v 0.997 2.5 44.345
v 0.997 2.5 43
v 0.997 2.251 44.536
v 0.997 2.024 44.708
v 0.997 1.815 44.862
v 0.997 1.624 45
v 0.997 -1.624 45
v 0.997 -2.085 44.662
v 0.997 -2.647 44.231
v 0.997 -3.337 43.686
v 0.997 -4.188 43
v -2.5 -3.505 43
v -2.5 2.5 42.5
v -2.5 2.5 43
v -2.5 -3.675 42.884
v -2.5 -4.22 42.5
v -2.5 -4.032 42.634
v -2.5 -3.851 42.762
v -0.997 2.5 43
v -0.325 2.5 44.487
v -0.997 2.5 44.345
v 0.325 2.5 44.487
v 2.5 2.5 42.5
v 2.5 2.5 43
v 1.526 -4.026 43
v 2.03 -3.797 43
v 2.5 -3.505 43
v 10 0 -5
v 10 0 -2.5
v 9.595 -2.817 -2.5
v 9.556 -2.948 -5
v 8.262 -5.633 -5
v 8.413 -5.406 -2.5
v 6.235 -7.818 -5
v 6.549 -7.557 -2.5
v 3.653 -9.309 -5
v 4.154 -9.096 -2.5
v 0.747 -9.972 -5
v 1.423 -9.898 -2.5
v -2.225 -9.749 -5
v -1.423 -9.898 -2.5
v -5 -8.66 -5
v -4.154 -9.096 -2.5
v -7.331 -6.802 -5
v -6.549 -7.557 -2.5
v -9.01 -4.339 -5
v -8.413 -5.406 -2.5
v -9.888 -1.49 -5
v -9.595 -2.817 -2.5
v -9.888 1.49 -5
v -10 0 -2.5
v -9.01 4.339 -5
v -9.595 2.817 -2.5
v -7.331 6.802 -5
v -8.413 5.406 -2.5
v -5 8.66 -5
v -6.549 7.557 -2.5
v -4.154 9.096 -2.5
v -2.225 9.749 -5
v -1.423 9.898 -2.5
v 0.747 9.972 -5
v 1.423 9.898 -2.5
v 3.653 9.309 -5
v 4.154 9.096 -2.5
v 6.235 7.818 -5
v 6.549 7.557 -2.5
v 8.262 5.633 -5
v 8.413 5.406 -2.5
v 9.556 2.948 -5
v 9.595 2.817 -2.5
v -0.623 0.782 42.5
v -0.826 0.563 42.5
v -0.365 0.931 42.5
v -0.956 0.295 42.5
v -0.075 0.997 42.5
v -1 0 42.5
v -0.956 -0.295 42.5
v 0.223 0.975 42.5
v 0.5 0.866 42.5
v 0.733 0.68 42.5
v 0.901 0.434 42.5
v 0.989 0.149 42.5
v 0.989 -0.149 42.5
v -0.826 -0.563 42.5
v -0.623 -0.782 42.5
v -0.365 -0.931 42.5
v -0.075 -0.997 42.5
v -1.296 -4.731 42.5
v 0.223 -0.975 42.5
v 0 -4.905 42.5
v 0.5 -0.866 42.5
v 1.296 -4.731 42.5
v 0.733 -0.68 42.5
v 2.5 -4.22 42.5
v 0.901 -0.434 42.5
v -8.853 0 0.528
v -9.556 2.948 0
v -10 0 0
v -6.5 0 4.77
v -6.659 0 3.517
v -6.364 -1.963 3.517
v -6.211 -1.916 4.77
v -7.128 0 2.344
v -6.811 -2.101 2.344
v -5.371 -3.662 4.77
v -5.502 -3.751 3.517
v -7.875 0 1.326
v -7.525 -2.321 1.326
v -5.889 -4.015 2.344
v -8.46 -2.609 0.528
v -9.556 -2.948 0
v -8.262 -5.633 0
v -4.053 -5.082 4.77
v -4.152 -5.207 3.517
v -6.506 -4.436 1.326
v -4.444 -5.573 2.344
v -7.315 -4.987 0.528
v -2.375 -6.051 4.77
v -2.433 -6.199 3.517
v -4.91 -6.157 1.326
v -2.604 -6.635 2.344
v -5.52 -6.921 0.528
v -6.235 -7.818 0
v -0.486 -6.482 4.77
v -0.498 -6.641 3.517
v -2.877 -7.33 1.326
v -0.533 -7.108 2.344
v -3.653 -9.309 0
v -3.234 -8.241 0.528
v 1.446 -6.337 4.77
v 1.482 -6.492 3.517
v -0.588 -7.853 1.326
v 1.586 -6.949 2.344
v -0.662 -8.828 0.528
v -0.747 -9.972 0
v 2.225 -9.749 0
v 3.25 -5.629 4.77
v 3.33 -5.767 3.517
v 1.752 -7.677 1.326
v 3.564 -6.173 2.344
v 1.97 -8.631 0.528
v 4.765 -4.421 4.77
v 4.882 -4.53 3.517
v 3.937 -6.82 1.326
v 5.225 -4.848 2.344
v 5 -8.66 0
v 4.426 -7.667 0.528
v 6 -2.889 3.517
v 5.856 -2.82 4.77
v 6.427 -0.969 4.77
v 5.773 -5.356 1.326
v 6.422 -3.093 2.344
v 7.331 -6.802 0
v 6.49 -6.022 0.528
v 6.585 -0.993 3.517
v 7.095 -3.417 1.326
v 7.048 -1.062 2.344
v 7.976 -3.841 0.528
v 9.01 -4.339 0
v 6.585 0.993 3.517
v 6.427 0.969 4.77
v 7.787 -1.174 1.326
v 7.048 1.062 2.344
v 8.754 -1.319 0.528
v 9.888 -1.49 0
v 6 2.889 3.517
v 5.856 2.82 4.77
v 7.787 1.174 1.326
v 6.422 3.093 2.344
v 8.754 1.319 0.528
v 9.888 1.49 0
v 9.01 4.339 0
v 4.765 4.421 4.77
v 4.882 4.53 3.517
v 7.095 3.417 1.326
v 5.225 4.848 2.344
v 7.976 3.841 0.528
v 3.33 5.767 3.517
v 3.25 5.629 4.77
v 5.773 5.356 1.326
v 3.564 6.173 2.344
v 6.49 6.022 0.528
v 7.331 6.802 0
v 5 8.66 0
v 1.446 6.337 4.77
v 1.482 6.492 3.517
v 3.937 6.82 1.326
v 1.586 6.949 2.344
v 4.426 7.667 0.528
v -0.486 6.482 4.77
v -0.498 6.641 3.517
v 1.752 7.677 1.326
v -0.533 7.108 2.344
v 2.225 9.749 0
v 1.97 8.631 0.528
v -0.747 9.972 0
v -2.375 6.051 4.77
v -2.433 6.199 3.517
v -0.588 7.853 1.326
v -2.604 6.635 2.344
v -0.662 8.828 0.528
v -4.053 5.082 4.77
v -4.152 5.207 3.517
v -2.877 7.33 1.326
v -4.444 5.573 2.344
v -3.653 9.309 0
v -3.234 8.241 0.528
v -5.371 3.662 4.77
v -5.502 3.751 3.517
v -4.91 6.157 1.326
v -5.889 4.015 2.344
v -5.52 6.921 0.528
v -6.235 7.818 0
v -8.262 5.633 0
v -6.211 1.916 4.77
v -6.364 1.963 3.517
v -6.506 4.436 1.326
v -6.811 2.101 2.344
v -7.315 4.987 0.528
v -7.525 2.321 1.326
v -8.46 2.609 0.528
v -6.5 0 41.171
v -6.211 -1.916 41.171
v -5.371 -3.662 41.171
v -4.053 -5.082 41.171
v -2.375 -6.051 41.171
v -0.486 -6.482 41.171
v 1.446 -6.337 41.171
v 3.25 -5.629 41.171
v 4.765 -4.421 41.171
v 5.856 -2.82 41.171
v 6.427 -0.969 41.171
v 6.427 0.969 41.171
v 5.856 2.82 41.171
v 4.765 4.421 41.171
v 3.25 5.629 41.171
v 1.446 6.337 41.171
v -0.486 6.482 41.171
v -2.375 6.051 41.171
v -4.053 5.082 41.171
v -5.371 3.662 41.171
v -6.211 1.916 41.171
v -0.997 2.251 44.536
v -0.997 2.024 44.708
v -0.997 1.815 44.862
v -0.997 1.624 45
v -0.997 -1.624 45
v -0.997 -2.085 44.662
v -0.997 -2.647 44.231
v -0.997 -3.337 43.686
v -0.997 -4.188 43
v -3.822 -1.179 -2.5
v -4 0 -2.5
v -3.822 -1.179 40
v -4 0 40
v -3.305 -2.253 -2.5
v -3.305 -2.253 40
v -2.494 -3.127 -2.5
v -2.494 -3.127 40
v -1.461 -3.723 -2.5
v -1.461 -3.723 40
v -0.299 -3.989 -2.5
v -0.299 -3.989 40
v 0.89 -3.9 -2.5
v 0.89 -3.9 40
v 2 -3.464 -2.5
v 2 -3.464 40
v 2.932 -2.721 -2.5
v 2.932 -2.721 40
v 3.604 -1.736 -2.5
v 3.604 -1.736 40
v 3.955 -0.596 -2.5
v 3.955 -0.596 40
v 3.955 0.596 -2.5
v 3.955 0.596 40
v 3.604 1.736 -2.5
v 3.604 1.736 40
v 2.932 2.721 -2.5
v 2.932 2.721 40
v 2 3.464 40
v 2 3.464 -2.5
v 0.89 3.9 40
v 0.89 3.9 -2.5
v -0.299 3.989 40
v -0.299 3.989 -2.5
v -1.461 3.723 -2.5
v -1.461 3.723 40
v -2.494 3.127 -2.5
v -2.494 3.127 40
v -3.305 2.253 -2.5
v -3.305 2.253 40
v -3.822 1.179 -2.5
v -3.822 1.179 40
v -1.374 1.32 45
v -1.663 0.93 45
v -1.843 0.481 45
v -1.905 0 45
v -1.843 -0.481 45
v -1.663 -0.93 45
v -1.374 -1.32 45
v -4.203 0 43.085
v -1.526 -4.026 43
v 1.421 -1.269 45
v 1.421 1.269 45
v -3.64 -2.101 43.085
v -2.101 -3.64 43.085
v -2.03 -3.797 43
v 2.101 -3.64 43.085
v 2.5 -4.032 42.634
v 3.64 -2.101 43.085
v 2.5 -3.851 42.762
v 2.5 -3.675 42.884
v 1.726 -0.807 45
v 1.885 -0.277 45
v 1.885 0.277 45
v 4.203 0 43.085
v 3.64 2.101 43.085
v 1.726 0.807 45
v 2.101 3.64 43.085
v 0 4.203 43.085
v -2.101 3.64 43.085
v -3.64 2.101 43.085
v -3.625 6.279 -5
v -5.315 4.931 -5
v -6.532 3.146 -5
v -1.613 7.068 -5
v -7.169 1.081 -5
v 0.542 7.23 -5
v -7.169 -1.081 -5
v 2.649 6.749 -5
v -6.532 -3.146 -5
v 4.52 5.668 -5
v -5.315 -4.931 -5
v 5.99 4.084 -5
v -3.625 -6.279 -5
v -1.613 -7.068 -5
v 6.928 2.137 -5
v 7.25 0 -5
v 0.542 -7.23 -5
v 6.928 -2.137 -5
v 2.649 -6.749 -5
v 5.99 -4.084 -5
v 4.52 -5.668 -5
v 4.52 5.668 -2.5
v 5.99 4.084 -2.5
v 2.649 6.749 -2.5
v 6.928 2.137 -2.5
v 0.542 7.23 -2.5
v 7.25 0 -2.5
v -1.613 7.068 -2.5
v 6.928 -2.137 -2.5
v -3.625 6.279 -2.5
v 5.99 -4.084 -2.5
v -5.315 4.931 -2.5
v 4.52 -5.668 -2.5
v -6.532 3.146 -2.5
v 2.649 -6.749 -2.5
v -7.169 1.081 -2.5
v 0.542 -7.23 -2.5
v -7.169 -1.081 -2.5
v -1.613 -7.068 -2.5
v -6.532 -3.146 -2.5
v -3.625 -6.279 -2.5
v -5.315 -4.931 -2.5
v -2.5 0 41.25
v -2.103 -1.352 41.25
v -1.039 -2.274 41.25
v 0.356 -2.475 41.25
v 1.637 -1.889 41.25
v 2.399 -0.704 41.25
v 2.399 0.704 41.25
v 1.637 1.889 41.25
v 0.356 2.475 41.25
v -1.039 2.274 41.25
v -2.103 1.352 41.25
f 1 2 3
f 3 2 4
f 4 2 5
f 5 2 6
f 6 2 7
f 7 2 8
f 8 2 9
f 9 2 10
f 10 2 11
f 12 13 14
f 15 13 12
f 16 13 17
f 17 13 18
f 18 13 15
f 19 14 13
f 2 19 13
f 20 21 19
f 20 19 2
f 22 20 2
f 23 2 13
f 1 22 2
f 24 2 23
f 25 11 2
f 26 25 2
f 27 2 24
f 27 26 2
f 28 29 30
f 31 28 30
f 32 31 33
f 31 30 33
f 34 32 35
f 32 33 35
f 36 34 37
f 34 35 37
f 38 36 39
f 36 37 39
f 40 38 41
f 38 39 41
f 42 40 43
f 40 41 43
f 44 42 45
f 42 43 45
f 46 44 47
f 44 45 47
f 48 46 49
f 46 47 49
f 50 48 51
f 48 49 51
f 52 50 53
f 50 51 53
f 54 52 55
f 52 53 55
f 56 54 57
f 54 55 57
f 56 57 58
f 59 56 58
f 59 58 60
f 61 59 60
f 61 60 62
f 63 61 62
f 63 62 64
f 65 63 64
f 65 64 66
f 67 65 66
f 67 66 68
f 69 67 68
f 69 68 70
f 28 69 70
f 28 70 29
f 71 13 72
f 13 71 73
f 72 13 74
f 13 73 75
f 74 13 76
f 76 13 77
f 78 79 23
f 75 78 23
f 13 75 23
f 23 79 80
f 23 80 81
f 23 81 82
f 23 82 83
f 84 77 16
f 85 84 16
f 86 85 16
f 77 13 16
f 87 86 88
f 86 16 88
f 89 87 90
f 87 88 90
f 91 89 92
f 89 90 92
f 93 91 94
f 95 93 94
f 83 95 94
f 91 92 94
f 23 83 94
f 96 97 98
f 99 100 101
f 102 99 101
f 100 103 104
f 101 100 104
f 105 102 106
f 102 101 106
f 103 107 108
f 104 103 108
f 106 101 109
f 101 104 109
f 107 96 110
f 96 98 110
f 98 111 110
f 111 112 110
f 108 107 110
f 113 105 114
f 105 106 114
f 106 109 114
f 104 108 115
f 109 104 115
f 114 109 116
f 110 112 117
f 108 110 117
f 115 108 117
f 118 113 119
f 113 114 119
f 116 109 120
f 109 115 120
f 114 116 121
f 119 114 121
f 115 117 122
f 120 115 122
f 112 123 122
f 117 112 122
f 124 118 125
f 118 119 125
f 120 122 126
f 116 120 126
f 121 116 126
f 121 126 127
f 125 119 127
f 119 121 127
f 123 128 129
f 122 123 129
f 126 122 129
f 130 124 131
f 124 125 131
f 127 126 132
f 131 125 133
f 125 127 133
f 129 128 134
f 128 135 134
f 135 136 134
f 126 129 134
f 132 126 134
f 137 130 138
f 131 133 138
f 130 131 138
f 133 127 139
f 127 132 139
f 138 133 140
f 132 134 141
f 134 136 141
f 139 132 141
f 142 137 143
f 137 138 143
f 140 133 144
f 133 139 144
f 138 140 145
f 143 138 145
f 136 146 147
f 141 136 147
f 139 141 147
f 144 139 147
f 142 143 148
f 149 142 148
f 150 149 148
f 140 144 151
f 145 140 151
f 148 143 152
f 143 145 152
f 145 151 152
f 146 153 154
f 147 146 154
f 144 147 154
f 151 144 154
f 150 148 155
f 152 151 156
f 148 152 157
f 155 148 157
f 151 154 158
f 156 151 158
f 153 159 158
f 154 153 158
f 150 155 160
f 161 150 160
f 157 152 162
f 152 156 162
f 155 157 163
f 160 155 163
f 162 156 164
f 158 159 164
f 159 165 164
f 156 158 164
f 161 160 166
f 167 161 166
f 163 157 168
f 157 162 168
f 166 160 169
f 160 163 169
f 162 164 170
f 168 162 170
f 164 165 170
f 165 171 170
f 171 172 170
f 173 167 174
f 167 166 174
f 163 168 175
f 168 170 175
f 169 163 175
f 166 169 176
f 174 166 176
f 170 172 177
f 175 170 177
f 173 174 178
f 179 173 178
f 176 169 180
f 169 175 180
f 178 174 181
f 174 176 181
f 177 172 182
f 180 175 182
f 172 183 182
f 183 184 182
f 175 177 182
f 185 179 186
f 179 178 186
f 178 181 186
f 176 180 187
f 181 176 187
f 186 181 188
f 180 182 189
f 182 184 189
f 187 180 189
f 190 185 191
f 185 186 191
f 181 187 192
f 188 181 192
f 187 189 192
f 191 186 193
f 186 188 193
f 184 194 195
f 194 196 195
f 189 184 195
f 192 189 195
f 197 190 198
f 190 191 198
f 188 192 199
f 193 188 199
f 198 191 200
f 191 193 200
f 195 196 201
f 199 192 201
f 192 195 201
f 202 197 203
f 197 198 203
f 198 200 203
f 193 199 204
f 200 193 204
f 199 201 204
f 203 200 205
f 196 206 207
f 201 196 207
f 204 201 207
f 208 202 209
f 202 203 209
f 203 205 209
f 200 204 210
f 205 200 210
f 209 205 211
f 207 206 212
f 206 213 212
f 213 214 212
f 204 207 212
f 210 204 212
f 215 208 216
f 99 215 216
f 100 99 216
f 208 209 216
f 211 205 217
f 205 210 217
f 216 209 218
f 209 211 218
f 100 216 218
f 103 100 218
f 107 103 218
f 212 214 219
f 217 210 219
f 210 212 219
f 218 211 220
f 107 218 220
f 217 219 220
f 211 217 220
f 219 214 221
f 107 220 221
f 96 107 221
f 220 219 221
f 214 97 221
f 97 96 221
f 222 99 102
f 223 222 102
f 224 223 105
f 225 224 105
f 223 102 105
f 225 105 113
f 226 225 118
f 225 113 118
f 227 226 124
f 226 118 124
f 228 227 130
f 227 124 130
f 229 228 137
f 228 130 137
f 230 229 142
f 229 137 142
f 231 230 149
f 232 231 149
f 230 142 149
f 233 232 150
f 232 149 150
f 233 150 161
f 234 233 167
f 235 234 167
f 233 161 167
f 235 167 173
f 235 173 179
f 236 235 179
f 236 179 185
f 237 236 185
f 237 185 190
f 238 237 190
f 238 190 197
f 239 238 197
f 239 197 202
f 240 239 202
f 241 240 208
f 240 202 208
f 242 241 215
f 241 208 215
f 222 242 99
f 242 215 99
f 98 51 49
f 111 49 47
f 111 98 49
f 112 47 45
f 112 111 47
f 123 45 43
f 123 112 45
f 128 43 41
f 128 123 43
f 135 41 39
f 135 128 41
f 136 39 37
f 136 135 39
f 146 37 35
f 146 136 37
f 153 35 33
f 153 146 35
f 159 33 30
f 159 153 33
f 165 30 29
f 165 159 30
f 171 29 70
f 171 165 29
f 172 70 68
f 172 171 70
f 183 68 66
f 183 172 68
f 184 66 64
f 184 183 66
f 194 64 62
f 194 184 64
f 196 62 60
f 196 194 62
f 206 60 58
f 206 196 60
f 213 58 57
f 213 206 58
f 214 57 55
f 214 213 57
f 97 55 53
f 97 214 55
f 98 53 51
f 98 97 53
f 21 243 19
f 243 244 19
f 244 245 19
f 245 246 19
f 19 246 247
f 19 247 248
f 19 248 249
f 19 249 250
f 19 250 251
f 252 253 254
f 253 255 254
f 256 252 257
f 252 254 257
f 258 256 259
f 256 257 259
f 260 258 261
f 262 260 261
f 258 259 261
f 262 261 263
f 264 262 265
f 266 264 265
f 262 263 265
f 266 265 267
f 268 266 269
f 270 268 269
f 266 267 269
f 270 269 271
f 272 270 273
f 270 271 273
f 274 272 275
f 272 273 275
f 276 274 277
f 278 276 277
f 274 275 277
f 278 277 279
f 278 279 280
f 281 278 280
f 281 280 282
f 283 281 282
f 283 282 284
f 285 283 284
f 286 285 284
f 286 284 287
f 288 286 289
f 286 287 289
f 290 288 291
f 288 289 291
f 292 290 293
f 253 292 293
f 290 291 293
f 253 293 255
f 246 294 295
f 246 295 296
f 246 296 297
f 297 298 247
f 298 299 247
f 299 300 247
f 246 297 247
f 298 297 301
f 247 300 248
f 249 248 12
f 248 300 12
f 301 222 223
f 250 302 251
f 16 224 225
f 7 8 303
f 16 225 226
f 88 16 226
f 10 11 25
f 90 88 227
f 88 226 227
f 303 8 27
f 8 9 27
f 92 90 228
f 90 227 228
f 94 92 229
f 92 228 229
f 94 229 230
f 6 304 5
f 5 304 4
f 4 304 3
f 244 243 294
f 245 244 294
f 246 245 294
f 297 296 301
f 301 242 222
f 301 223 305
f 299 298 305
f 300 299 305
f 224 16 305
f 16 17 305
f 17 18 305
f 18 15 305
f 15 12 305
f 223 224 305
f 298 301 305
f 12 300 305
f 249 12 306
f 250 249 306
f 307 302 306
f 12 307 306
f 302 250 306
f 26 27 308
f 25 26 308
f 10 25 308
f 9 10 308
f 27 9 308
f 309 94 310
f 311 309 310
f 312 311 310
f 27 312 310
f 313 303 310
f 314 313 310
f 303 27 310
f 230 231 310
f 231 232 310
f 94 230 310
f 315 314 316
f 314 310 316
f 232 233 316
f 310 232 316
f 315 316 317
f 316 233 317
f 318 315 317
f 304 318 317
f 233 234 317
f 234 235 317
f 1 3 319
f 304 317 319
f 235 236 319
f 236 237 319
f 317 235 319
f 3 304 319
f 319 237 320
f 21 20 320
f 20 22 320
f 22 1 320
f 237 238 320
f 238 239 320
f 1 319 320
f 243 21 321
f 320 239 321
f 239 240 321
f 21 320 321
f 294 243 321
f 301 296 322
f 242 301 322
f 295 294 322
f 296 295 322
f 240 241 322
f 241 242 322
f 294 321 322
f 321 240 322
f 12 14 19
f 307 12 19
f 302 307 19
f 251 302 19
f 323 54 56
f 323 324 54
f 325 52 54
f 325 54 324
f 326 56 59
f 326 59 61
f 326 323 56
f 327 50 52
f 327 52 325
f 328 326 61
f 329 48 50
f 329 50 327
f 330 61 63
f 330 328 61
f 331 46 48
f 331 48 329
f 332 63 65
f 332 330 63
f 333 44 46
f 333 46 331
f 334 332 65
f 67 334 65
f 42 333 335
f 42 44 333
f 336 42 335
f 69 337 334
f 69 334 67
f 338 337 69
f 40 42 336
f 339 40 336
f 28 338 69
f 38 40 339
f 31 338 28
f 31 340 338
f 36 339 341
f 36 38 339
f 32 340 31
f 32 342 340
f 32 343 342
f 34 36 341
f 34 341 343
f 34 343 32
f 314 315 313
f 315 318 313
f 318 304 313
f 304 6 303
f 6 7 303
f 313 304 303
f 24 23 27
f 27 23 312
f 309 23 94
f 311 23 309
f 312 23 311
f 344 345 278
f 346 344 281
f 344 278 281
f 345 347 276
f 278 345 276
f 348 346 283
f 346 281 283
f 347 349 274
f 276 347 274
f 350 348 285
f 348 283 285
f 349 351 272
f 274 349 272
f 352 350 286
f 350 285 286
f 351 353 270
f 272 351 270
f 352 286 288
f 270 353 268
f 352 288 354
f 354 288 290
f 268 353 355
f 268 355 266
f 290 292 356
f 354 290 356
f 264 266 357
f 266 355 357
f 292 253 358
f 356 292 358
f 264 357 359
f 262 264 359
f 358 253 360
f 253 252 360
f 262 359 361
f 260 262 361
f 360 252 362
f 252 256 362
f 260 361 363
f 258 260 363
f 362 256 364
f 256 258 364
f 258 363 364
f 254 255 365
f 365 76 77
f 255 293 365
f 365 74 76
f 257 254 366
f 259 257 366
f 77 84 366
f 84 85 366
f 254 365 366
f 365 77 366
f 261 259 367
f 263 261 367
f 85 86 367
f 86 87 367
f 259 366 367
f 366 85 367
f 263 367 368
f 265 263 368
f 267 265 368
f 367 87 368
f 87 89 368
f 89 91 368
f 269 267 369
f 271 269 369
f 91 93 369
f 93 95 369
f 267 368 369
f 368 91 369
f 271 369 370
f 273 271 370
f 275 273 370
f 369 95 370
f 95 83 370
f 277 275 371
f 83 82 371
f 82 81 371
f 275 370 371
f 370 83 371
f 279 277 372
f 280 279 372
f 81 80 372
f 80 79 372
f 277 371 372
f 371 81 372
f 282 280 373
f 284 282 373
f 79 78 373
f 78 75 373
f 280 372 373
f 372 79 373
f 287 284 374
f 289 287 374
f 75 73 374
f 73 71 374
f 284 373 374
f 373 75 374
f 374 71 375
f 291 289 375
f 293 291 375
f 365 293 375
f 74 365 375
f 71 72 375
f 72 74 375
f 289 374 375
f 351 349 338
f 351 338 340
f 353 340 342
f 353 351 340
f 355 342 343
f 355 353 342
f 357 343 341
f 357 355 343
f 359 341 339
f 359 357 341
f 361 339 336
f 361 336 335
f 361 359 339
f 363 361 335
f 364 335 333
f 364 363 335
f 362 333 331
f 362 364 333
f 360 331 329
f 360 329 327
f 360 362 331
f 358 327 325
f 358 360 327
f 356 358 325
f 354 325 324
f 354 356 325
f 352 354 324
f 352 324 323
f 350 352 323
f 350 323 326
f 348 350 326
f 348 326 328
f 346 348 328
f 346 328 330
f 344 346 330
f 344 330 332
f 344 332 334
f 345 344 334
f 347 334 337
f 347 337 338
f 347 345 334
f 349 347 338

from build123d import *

# Parameters (mm, degrees)
F0_W     = 2.5
F0_H     = 2.5
F0_W_2   = 3.5
F3_W     = 1.9934664722
F3_H     = 2
F3_H_2   = 0.5
F3_W_2   = 1.5032667639
F4_DEPTH = 27.5
F5_R     = 10
F5_R_2   = 7.25
F6_DEPTH = 2.5


# Not quite as in the source:
# - a fillet or chamfer that OpenCascade refuses, or shapes differently, is made with other operations: its cross-section is extruded or revolved along the edge and cut away or added


with BuildPart() as f1:
    # F0 (on Front) → F1 (revolve)
    with BuildSketch(Plane.XZ):
        Polygon((-6.5, 0), (-4, 0), (-4, 40), (-1, 42.5), (0, 42.5), (0, 45), (-1.905124838, 45), (-6.5, 41.170937365), align=None)
        with Locations((-5.25, -1.25)):
            Rectangle(F0_W, F0_H)
        with Locations((-8.25, -1.25)):
            Rectangle(F0_W_2, F0_H)
    revolve(axis=Axis((0, 0, 20), (0, 0, 1)))

    # F3 (on offset) → F4 (cut)
    with BuildSketch(Plane.XZ.offset(25)):
        with Locations((0, 44)):
            Rectangle(F3_W, F3_H)
        with Locations((0, 42.75)):
            Rectangle(F3_W, F3_H_2)
        with Locations((-1.7483666181, 42.75)):
            Rectangle(F3_W_2, F3_H_2)
        with Locations((1.7483666181, 42.75)):
            Rectangle(F3_W_2, F3_H_2)
    extrude(amount=-F4_DEPTH, mode=Mode.SUBTRACT)

    # F5 (on face) → F6 (join)
    with BuildSketch(Plane(origin=(0, 0, -2.5), x_dir=(1, 0, 0), z_dir=(0, 0, -1))):
        Circle(F5_R)
        Circle(F5_R_2, mode=Mode.SUBTRACT)
    extrude(amount=F6_DEPTH)

    # F7: fillet of radius 5 on 1 edges, made by hand

    # F7_s1 → F7_t2 (revolve)
    with BuildSketch(Plane.XZ):
        with BuildLine():
            ThreePointArc((-6.5, 4.7696960071), (-7.4688711259, 1.8116561155), (-10, 0))
            Line((-10, 0), (-6.5, 0))
            Line((-6.5, 0), (-6.5, 4.7696960071))
        make_face()
    revolve(axis=Axis((0, 0, 0), (0, 0, 1)))


solid = f1.part
